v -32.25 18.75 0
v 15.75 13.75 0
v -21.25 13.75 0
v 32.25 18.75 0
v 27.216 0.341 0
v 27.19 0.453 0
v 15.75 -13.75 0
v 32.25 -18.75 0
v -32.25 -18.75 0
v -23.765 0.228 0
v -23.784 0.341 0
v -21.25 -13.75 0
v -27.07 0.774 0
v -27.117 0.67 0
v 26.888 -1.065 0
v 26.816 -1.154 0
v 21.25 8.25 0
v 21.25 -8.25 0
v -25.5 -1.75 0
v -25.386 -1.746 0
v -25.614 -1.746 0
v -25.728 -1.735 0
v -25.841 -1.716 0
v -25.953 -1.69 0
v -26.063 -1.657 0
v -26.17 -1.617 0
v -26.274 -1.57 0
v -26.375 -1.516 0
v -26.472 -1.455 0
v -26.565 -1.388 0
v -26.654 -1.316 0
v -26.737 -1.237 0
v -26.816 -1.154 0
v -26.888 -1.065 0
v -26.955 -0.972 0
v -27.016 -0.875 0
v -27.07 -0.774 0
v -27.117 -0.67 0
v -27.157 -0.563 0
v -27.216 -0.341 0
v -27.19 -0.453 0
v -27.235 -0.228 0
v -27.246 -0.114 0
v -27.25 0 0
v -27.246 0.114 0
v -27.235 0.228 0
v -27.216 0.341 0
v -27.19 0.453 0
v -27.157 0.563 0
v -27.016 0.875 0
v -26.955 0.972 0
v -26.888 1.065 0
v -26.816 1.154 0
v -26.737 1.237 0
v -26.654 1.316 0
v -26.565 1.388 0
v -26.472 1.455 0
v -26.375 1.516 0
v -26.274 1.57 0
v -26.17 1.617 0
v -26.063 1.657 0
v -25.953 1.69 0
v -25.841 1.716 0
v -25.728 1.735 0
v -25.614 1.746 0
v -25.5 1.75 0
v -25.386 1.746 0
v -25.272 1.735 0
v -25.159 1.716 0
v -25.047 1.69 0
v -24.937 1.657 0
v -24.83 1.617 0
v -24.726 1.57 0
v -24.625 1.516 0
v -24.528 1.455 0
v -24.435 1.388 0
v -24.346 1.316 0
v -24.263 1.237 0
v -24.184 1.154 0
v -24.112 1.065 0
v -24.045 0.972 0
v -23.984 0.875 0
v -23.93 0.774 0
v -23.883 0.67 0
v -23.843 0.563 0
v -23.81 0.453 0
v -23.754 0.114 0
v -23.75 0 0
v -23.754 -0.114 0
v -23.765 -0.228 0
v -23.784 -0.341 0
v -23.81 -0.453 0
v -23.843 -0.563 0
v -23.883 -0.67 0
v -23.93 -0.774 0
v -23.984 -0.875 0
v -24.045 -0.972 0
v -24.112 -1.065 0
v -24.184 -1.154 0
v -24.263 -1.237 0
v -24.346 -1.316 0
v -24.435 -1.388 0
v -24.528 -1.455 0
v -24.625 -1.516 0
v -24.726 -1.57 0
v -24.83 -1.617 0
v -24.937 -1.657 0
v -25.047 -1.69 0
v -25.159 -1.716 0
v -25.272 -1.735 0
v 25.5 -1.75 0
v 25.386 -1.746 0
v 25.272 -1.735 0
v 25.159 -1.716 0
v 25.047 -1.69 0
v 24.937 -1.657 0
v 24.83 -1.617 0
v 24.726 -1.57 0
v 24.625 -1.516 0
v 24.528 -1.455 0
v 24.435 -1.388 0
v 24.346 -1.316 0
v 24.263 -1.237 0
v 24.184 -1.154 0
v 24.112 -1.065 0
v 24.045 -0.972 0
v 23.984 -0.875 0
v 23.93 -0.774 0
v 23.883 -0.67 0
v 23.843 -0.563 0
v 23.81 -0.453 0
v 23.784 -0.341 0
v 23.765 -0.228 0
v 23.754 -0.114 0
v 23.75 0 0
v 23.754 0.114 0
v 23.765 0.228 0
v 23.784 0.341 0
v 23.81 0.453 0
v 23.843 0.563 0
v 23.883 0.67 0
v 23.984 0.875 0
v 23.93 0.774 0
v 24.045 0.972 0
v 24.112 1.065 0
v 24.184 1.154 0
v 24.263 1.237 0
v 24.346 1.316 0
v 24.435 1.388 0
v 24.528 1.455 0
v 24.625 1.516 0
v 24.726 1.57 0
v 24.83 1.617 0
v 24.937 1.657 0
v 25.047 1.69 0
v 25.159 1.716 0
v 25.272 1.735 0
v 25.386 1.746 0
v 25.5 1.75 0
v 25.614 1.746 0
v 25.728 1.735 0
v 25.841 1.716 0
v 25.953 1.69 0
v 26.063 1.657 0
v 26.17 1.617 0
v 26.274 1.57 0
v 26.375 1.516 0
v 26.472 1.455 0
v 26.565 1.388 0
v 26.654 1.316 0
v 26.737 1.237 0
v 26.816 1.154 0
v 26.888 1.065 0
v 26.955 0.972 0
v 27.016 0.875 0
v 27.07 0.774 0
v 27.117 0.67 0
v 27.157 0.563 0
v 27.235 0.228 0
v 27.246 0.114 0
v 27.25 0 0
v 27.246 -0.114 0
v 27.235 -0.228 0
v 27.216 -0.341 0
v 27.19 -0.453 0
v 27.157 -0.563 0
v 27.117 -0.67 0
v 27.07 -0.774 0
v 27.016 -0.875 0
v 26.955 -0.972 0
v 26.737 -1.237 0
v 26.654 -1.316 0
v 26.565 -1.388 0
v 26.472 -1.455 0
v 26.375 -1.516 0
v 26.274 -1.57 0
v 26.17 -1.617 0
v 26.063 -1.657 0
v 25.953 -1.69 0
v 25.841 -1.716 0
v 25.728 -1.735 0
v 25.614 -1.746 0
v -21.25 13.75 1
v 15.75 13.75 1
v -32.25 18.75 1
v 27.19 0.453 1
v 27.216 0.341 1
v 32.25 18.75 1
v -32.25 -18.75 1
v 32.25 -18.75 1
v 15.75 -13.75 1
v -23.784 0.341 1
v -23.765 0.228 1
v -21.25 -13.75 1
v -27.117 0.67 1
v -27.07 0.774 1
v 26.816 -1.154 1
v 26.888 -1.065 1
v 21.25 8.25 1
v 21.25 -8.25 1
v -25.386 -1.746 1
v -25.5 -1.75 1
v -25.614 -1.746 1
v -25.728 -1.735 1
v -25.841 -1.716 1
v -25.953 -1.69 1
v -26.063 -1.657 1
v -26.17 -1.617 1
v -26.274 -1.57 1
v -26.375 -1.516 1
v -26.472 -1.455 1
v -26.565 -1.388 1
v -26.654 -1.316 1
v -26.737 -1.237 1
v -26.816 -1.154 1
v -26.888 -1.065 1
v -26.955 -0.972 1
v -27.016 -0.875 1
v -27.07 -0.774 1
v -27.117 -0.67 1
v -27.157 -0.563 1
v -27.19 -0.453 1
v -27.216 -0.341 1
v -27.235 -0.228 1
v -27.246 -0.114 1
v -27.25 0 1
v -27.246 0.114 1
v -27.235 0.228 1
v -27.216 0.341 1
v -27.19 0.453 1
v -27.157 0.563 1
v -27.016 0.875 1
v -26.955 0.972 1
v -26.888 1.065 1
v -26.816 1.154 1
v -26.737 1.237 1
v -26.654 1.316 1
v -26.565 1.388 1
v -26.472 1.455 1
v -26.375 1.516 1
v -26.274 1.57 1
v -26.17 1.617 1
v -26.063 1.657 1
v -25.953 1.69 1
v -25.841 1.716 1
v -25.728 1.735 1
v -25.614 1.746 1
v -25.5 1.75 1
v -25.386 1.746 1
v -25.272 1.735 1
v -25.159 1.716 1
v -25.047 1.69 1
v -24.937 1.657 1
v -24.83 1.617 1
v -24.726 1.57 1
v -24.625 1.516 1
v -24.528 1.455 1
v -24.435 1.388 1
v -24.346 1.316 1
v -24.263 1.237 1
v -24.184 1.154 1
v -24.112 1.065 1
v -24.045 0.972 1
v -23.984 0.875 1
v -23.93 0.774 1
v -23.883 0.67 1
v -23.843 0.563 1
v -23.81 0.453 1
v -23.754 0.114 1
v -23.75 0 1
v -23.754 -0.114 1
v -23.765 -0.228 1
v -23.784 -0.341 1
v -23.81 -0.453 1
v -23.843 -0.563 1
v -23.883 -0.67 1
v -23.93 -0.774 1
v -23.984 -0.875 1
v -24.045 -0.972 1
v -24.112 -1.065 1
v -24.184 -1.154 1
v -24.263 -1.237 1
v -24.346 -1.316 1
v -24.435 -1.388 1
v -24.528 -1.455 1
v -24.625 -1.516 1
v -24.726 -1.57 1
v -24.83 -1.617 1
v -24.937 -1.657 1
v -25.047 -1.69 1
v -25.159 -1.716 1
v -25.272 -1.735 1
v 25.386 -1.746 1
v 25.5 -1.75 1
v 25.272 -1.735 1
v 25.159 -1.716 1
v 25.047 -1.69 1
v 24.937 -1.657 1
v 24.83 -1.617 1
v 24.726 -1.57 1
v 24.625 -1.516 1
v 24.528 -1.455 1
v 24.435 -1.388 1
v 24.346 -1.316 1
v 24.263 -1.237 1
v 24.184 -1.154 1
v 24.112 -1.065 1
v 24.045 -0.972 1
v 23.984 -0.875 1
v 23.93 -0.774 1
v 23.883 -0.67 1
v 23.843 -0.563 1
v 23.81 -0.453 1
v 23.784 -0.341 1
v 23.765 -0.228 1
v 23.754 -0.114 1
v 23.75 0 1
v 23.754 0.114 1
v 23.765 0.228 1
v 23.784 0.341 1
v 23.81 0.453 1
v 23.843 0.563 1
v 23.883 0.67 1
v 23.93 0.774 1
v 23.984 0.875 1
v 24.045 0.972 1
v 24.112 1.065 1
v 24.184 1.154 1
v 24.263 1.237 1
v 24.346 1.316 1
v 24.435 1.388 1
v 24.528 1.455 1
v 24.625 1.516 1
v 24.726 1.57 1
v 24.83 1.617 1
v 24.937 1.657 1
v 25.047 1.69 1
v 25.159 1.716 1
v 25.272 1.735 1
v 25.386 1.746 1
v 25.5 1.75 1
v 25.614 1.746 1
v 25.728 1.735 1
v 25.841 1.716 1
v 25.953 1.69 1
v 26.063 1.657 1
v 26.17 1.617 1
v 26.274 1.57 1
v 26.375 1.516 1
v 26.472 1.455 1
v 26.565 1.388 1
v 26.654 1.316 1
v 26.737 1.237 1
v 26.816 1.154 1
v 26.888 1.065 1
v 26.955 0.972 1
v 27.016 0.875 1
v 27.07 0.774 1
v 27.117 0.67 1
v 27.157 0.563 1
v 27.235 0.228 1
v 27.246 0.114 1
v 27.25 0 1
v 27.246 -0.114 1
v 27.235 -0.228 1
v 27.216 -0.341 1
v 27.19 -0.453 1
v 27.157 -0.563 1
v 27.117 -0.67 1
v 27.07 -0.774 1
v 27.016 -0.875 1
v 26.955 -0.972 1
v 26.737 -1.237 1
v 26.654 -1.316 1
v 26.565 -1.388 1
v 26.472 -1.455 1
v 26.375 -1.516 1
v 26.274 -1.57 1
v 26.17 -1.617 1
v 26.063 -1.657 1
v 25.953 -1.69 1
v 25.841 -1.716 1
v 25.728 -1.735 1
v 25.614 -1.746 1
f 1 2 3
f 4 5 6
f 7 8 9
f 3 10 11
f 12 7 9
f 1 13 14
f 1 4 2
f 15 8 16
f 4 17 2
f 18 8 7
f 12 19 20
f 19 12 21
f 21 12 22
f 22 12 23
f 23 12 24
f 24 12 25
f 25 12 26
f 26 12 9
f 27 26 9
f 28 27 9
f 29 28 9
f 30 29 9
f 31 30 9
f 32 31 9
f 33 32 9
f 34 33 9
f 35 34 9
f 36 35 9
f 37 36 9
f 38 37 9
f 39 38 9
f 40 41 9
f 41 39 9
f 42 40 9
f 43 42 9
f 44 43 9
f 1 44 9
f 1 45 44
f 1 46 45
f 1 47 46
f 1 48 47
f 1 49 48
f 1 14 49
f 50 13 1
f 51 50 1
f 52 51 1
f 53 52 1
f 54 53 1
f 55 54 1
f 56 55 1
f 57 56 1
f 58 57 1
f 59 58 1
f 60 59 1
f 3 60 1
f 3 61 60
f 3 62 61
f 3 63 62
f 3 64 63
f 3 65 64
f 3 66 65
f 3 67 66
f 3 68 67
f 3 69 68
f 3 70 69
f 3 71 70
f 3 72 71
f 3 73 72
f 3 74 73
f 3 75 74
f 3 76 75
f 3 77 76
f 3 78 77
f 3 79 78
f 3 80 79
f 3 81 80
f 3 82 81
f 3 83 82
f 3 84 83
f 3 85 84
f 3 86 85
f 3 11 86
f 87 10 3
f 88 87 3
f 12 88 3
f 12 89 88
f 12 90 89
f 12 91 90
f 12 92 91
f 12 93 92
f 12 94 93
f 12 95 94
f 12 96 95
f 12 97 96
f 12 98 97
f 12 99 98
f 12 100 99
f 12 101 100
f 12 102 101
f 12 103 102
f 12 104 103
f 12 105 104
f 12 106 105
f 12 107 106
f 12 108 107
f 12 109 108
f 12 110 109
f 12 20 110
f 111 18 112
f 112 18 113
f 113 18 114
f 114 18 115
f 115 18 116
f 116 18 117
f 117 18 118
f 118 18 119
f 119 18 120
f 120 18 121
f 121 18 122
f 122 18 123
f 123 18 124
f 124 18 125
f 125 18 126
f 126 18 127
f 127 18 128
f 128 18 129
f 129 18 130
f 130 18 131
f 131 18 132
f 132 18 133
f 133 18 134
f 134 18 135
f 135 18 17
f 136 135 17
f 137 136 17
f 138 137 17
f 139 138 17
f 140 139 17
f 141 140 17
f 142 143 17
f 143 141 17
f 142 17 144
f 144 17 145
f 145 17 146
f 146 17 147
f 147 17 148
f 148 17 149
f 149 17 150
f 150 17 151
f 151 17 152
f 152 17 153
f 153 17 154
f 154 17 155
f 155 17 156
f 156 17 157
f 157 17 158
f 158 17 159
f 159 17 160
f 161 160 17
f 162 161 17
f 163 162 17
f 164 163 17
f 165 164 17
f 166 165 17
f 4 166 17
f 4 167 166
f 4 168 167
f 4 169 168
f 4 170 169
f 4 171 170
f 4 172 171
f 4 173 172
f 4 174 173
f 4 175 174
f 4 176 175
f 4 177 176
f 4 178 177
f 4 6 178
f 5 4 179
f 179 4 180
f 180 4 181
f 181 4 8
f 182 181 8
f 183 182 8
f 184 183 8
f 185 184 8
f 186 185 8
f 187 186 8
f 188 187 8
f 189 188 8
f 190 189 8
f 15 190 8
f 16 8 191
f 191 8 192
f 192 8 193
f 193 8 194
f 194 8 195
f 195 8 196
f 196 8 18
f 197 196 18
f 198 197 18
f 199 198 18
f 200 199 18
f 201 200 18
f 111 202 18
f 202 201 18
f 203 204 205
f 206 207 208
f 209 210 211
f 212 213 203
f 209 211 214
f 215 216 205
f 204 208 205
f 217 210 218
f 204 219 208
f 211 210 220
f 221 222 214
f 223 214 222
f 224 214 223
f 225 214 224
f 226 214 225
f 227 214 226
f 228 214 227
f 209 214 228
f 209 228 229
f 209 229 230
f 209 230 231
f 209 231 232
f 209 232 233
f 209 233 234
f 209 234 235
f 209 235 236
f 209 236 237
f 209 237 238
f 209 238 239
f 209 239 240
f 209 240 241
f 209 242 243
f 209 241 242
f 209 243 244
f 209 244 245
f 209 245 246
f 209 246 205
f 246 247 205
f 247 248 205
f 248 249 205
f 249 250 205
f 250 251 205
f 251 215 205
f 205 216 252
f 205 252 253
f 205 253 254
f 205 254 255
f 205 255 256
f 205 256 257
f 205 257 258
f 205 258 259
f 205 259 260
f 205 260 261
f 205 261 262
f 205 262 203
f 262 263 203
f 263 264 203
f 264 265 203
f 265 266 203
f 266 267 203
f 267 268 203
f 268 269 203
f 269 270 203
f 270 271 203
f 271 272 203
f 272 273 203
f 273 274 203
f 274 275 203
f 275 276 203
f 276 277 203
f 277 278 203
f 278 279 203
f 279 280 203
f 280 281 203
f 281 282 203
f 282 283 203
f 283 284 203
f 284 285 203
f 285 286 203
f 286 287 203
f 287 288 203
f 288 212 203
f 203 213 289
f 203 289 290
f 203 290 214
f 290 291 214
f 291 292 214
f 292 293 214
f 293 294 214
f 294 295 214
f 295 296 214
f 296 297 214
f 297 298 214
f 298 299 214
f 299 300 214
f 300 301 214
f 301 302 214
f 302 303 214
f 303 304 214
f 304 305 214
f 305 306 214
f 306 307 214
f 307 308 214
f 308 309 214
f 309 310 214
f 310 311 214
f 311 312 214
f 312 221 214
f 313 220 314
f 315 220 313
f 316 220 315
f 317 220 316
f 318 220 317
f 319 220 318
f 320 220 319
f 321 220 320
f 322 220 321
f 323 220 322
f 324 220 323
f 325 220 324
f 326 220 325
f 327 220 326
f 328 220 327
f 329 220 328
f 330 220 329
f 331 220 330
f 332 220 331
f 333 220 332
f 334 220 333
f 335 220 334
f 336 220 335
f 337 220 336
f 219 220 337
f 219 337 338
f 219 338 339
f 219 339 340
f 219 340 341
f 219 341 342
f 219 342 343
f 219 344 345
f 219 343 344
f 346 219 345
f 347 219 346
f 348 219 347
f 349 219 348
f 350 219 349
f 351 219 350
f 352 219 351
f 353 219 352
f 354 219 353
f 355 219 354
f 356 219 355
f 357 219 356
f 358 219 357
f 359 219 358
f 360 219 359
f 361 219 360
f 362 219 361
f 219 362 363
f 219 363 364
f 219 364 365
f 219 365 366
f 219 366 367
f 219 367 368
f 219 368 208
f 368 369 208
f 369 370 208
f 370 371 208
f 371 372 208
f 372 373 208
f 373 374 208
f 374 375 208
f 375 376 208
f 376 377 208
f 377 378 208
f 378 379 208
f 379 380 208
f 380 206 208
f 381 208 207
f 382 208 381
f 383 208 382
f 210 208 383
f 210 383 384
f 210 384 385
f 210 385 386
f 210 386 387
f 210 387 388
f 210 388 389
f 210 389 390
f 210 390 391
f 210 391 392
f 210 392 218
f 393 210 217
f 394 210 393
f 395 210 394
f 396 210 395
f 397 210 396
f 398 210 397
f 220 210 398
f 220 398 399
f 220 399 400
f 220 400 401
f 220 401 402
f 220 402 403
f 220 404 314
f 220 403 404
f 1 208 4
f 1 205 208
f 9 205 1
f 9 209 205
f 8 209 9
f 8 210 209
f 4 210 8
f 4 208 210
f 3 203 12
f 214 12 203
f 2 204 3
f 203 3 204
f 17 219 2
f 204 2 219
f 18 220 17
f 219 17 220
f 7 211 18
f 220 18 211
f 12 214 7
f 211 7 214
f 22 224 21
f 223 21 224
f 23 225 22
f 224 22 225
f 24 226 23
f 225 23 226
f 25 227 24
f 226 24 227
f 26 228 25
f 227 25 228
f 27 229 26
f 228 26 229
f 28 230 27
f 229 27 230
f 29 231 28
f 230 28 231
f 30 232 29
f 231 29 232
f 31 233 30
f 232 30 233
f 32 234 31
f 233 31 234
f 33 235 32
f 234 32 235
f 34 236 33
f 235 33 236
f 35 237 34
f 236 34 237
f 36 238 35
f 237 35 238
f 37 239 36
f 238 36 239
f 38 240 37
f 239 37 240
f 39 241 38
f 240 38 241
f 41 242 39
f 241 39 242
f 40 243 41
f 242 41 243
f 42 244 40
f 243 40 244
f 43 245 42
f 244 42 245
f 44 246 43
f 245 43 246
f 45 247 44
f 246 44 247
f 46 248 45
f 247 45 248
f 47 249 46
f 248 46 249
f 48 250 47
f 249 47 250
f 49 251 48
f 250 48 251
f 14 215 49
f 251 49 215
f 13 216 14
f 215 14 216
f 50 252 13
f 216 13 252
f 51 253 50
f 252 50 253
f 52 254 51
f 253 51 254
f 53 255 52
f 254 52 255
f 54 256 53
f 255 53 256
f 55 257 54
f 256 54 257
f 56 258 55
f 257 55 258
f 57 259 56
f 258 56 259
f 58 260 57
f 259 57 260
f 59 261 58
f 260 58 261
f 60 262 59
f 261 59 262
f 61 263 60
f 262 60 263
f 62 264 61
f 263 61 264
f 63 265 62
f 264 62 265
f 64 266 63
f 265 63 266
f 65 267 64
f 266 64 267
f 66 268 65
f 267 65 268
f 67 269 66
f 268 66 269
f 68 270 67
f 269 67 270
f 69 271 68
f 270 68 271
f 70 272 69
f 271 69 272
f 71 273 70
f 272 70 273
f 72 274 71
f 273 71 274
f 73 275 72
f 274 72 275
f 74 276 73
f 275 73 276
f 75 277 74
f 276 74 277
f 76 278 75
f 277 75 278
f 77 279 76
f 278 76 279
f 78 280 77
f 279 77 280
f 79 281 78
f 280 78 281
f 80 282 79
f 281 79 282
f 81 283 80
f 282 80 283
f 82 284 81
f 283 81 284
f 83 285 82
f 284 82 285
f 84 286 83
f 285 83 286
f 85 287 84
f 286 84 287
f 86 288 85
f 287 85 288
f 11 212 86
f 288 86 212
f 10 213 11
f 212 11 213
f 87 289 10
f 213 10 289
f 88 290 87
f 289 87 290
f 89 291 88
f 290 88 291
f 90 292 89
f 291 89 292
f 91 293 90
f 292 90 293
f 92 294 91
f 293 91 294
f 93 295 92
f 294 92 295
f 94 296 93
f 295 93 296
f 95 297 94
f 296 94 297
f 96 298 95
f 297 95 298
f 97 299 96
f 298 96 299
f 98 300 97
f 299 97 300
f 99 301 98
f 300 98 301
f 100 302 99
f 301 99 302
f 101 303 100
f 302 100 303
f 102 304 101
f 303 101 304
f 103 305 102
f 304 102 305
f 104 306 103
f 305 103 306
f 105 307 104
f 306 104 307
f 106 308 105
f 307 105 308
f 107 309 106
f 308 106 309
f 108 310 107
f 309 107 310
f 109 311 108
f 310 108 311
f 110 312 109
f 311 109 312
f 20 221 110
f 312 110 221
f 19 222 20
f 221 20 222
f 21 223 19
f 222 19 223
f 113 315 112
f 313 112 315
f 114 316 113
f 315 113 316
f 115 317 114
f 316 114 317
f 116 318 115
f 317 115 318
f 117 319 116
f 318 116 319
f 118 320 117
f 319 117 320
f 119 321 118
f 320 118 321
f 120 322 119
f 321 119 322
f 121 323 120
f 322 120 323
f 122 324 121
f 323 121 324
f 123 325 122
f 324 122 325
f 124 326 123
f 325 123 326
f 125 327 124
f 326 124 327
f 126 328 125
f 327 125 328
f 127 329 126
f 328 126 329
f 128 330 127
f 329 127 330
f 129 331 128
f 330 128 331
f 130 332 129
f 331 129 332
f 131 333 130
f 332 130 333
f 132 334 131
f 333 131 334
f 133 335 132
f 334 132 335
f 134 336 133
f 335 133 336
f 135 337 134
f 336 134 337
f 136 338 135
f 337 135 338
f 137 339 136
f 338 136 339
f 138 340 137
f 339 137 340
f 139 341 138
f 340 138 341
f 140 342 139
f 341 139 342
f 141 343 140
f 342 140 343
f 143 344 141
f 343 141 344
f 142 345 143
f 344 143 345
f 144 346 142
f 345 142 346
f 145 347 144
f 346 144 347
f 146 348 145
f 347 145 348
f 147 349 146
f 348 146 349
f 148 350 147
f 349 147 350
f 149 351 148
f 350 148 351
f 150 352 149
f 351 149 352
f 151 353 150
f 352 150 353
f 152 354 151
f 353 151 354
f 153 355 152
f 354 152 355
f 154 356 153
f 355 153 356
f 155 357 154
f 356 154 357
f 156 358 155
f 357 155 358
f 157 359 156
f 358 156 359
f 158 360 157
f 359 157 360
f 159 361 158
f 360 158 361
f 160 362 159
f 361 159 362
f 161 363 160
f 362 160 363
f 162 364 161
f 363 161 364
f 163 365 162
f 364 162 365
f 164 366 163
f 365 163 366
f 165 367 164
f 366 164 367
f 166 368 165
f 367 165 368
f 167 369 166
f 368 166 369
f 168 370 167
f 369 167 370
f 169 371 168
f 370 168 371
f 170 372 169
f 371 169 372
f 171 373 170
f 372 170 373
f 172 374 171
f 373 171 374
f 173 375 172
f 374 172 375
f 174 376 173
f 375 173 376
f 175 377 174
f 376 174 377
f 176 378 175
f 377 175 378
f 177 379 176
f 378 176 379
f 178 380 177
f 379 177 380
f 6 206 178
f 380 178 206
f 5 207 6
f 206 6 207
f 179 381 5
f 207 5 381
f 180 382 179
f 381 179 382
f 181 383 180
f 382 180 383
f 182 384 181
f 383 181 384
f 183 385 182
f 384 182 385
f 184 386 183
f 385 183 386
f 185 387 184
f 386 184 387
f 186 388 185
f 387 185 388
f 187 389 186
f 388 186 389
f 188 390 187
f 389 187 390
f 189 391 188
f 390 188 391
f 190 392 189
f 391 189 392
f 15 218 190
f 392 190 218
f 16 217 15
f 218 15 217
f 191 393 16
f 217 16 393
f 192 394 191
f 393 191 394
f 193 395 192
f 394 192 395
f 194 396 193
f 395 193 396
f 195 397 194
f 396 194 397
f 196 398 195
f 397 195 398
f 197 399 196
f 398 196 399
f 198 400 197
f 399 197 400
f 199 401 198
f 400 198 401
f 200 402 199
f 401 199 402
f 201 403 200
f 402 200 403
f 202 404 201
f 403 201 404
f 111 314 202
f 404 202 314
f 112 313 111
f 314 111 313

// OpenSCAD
thickness = 1;
hole_spacing = 51;
hole_diameter = 3.5;
cutout_x = 42.5;
cutout_y = 27.5;
chamfer_width = 5.5;
edge_margin = 5;

$fn = 96;

plate_length = hole_spacing + hole_diameter + 2 * edge_margin;
plate_width = max(hole_diameter, cutout_y) + 2 * edge_margin;

assert(thickness > 0, "Thickness must be positive.");
assert(hole_diameter > 0, "Hole diameter must be positive.");
assert(cutout_x > 0 && cutout_y > 0, "Cutout dimensions must be positive.");
assert(edge_margin > 0, "Edge margin must be positive.");
assert(cutout_x < hole_spacing - hole_diameter,
       "The rectangular cutout must fit between the holes.");
assert(chamfer_width >= 0 && chamfer_width < cutout_x &&
    2 * chamfer_width < cutout_y,
    "Chamfer width must be nonnegative and fit within the cutout.");

linear_extrude(height = thickness)
    difference() {
        square([plate_length, plate_width], center = true);

        for (hole_x = [-hole_spacing / 2, hole_spacing / 2])
            translate([hole_x, 0])
                circle(d = hole_diameter);

        if (chamfer_width == 0)
            square([cutout_x, cutout_y], center = true);
        else
            polygon(points = [
                [-cutout_x / 2, -cutout_y / 2],
                [cutout_x / 2 - chamfer_width, -cutout_y / 2],
                [cutout_x / 2, -cutout_y / 2 + chamfer_width],
                [cutout_x / 2, cutout_y / 2 - chamfer_width],
                [cutout_x / 2 - chamfer_width, cutout_y / 2],
                [-cutout_x / 2, cutout_y / 2]
            ]);
    }
